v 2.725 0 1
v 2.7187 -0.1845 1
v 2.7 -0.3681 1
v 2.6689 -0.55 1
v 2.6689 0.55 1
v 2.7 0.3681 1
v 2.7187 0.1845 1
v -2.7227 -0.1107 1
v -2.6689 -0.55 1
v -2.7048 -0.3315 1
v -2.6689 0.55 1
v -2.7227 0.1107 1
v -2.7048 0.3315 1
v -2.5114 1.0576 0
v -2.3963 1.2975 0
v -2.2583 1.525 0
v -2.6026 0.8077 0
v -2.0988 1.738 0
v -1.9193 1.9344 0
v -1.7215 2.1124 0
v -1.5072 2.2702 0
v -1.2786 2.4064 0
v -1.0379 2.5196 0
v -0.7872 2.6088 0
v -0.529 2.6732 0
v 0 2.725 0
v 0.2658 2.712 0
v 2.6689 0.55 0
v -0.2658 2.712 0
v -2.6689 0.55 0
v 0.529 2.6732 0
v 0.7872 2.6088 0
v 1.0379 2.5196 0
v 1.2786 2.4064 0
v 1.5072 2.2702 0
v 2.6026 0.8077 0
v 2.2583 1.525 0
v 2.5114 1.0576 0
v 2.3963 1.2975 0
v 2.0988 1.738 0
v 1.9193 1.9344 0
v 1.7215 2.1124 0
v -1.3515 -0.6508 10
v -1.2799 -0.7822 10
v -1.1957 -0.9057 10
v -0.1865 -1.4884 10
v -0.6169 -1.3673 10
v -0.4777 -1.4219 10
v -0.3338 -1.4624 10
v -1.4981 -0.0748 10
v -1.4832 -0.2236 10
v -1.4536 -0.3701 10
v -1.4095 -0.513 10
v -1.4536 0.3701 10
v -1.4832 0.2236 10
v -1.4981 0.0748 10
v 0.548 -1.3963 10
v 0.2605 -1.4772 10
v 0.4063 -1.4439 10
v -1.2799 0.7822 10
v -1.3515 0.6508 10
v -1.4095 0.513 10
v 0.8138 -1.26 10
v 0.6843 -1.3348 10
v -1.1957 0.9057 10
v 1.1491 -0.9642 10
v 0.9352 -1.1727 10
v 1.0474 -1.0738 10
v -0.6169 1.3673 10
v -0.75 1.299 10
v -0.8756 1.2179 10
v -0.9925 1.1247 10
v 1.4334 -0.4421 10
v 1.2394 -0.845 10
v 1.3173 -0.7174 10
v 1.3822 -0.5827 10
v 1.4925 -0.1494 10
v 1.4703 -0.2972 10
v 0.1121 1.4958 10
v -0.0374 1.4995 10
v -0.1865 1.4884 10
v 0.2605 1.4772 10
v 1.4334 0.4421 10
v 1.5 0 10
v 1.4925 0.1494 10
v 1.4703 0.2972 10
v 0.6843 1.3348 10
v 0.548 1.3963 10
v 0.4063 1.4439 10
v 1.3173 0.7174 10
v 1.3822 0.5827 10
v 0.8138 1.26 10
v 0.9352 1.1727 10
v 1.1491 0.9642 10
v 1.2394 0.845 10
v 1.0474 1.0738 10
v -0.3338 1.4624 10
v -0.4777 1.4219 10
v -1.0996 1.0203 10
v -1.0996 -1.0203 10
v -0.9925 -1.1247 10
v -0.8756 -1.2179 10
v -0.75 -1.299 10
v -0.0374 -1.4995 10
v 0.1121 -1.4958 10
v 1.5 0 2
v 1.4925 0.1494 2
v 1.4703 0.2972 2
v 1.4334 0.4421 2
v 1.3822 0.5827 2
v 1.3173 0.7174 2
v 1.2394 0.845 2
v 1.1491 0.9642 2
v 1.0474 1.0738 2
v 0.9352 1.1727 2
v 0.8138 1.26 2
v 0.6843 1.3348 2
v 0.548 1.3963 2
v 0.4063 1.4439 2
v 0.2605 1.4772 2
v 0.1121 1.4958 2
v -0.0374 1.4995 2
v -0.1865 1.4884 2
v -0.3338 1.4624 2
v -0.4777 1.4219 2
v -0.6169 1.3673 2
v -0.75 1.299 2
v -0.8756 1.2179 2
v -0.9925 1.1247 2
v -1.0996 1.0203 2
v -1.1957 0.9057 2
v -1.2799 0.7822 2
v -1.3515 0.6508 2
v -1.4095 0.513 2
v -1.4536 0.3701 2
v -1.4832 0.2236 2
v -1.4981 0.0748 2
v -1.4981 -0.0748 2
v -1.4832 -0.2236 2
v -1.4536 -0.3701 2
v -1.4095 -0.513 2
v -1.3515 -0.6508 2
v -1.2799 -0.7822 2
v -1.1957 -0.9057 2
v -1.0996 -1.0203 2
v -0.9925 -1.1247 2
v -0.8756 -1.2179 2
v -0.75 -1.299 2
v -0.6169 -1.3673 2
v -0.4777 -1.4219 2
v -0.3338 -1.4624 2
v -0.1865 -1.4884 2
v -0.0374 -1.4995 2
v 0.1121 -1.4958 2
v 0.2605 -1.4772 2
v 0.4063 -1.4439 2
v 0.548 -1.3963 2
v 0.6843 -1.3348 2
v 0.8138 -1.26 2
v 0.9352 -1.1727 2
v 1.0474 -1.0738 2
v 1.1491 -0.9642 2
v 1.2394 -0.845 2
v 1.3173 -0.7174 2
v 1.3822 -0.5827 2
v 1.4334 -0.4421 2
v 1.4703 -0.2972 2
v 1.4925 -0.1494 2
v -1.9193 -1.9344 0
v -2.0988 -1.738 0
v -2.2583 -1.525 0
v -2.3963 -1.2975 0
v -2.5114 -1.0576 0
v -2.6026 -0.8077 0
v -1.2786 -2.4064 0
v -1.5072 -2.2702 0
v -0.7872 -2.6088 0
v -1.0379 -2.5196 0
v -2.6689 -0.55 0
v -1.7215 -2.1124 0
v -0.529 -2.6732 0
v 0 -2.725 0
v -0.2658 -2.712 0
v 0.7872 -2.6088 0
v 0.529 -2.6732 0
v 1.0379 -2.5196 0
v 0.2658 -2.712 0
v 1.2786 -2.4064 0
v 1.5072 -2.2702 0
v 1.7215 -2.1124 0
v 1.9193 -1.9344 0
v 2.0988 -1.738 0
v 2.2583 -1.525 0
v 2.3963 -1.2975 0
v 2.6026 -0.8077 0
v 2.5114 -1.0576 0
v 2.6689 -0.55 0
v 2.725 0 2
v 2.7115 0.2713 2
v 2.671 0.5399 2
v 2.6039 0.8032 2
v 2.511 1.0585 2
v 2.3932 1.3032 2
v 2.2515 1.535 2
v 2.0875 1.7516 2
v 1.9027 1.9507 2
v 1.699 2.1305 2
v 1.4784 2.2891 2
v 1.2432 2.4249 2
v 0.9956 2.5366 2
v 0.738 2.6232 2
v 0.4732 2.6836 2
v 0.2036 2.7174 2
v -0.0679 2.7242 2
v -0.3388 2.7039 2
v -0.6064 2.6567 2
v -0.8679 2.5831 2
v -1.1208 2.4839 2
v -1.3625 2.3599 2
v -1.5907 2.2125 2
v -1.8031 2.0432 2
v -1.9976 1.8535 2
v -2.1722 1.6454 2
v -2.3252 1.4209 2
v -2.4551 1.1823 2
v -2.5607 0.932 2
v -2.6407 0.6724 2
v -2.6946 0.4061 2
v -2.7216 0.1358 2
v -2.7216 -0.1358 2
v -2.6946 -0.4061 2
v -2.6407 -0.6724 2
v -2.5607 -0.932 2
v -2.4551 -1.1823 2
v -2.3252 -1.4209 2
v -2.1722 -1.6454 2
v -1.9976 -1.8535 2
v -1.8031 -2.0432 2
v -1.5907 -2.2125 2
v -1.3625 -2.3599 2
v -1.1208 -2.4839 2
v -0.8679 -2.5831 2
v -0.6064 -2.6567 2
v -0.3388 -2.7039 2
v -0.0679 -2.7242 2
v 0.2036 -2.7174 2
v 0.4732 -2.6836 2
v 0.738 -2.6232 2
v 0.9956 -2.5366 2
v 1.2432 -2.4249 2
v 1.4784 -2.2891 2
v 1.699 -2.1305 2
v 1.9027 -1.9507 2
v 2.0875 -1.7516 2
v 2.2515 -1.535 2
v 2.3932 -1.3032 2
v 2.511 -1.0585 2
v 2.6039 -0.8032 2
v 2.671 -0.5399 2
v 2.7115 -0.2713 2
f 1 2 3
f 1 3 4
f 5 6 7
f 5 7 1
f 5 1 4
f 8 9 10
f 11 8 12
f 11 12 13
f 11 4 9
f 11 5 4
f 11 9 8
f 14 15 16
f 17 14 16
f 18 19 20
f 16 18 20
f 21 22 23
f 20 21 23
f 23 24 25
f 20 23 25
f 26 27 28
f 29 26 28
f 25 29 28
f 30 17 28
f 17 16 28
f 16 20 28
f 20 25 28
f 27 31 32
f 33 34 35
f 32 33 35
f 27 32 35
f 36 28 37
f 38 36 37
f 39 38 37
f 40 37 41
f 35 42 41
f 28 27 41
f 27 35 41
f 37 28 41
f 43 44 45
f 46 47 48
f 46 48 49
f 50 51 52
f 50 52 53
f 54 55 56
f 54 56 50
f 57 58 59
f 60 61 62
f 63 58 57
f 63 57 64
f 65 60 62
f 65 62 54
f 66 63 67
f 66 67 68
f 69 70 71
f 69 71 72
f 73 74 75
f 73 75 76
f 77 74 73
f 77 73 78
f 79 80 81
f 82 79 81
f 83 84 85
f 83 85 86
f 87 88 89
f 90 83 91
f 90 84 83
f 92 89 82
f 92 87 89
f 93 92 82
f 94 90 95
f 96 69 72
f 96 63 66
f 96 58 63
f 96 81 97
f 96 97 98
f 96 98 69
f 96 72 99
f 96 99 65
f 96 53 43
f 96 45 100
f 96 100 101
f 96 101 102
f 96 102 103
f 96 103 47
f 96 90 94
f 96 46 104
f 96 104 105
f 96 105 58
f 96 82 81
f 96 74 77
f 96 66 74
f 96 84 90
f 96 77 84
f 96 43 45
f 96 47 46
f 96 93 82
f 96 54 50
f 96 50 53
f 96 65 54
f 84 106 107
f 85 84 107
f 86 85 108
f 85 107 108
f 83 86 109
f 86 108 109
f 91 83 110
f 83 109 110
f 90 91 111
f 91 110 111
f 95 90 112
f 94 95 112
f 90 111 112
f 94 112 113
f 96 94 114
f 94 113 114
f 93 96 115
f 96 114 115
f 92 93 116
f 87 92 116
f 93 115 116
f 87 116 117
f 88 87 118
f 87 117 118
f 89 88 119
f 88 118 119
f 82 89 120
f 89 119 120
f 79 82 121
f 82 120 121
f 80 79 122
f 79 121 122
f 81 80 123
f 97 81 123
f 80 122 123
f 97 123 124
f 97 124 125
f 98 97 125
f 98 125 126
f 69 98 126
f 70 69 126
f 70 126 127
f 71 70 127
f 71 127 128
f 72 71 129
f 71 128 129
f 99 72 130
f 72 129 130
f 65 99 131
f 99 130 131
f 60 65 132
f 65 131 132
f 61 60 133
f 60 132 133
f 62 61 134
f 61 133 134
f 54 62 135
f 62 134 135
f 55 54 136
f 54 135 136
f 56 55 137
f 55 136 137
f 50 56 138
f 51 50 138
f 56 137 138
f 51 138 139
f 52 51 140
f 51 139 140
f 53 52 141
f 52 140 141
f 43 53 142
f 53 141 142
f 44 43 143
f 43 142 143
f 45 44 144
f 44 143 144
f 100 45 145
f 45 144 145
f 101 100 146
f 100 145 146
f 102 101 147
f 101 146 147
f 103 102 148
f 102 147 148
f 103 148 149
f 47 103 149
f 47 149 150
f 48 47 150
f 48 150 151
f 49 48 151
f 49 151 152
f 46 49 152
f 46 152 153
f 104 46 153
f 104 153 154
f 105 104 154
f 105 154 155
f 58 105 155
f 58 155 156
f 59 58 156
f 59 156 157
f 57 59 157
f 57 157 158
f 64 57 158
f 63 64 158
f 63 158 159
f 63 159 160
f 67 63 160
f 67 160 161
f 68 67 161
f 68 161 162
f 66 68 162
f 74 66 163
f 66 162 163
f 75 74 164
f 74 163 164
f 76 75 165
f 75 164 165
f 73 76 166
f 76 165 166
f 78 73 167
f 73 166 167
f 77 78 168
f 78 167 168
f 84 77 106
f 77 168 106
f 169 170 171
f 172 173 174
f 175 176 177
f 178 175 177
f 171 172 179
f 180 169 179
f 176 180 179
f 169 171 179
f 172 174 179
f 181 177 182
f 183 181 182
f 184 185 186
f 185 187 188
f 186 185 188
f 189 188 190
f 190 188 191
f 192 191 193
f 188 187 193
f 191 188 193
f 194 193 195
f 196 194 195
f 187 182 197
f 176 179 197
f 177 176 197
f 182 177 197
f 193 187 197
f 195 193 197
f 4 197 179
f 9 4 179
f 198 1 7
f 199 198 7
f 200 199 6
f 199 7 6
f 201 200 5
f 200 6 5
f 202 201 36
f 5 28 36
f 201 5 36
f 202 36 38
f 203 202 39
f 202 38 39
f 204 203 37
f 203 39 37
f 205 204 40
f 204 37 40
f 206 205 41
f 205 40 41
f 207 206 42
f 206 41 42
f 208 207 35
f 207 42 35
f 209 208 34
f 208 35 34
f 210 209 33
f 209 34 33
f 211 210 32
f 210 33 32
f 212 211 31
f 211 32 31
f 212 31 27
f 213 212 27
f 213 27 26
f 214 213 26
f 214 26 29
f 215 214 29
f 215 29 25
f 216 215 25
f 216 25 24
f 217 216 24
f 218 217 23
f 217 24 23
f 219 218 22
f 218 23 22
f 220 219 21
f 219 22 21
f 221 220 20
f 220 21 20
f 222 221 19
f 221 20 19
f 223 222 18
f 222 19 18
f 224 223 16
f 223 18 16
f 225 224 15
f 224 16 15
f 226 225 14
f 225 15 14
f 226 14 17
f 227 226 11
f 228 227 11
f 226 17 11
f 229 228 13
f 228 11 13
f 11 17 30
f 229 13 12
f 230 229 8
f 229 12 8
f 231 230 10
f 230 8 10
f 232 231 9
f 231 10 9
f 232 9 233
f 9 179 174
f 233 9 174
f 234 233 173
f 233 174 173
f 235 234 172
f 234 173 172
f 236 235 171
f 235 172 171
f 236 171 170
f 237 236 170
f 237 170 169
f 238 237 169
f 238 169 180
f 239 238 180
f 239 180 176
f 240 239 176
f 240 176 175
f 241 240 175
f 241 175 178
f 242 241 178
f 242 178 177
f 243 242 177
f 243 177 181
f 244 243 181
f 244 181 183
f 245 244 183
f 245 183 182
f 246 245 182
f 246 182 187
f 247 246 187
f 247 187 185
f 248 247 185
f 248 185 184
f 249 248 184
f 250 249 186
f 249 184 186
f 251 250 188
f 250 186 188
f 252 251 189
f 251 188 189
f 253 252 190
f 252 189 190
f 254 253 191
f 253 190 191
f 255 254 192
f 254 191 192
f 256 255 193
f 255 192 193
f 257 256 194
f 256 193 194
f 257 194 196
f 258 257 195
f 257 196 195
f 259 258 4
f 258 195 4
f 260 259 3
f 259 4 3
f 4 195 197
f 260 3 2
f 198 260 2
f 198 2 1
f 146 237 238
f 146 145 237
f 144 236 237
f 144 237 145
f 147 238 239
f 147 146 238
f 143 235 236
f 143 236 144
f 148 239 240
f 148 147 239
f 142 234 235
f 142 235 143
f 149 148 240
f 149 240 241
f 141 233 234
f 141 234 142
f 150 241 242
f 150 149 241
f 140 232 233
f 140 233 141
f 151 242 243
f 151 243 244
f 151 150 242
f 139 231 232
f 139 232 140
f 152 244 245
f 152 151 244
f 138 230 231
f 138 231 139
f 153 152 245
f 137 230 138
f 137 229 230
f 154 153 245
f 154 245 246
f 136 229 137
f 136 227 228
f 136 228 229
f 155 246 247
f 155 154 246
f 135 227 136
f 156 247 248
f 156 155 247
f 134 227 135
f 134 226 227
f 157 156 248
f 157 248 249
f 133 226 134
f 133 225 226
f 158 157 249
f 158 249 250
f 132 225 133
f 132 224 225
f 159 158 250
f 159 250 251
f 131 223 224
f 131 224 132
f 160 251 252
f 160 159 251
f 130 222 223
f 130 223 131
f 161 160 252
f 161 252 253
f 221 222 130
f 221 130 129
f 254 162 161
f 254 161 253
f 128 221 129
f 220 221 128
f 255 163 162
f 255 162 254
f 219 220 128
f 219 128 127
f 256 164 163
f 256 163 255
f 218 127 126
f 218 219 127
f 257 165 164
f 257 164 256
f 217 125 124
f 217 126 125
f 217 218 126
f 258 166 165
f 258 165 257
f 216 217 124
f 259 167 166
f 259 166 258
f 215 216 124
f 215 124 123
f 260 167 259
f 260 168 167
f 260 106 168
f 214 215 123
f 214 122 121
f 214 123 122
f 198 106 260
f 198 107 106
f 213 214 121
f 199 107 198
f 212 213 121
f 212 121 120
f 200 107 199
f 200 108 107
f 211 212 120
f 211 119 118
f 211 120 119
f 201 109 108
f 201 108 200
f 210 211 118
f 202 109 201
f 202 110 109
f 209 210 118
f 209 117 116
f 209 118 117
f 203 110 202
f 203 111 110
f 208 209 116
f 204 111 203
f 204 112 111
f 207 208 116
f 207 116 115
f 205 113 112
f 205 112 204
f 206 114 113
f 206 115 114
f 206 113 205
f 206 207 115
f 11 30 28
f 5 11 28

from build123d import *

# Parameters (mm, degrees)
SKETCH1_R          = 2.725
EXTRUDE1_DEPTH     = 2
CUT_EXTRUDE1_DEPTH = 1
SKETCH3_R          = 1.5
EXTRUDE2_DEPTH     = 8


with BuildPart() as part:
    # Sketch1 → Extrude1 (new body)
    with BuildSketch(Plane.XY):
        Circle(SKETCH1_R)
    extrude(amount=EXTRUDE1_DEPTH)

    # Sketch2 → Cut-Extrude1 (cut)
    with BuildSketch(Plane(origin=(0, 0, 0), x_dir=(-1, 0, 0), z_dir=(0, 0, -1))):
        Polygon((3.449801909, 0), (3.449801909, 0.55), (-3.901269584, 0.55), (-3.901269584, -0.55), (3.449801909, -0.55), align=None)
    extrude(amount=-CUT_EXTRUDE1_DEPTH, mode=Mode.SUBTRACT)

    # Sketch3 → Extrude2 (add)
    with BuildSketch(Plane.XY.offset(2)):
        Circle(SKETCH3_R)
    extrude(amount=EXTRUDE2_DEPTH)


solid = part.part
